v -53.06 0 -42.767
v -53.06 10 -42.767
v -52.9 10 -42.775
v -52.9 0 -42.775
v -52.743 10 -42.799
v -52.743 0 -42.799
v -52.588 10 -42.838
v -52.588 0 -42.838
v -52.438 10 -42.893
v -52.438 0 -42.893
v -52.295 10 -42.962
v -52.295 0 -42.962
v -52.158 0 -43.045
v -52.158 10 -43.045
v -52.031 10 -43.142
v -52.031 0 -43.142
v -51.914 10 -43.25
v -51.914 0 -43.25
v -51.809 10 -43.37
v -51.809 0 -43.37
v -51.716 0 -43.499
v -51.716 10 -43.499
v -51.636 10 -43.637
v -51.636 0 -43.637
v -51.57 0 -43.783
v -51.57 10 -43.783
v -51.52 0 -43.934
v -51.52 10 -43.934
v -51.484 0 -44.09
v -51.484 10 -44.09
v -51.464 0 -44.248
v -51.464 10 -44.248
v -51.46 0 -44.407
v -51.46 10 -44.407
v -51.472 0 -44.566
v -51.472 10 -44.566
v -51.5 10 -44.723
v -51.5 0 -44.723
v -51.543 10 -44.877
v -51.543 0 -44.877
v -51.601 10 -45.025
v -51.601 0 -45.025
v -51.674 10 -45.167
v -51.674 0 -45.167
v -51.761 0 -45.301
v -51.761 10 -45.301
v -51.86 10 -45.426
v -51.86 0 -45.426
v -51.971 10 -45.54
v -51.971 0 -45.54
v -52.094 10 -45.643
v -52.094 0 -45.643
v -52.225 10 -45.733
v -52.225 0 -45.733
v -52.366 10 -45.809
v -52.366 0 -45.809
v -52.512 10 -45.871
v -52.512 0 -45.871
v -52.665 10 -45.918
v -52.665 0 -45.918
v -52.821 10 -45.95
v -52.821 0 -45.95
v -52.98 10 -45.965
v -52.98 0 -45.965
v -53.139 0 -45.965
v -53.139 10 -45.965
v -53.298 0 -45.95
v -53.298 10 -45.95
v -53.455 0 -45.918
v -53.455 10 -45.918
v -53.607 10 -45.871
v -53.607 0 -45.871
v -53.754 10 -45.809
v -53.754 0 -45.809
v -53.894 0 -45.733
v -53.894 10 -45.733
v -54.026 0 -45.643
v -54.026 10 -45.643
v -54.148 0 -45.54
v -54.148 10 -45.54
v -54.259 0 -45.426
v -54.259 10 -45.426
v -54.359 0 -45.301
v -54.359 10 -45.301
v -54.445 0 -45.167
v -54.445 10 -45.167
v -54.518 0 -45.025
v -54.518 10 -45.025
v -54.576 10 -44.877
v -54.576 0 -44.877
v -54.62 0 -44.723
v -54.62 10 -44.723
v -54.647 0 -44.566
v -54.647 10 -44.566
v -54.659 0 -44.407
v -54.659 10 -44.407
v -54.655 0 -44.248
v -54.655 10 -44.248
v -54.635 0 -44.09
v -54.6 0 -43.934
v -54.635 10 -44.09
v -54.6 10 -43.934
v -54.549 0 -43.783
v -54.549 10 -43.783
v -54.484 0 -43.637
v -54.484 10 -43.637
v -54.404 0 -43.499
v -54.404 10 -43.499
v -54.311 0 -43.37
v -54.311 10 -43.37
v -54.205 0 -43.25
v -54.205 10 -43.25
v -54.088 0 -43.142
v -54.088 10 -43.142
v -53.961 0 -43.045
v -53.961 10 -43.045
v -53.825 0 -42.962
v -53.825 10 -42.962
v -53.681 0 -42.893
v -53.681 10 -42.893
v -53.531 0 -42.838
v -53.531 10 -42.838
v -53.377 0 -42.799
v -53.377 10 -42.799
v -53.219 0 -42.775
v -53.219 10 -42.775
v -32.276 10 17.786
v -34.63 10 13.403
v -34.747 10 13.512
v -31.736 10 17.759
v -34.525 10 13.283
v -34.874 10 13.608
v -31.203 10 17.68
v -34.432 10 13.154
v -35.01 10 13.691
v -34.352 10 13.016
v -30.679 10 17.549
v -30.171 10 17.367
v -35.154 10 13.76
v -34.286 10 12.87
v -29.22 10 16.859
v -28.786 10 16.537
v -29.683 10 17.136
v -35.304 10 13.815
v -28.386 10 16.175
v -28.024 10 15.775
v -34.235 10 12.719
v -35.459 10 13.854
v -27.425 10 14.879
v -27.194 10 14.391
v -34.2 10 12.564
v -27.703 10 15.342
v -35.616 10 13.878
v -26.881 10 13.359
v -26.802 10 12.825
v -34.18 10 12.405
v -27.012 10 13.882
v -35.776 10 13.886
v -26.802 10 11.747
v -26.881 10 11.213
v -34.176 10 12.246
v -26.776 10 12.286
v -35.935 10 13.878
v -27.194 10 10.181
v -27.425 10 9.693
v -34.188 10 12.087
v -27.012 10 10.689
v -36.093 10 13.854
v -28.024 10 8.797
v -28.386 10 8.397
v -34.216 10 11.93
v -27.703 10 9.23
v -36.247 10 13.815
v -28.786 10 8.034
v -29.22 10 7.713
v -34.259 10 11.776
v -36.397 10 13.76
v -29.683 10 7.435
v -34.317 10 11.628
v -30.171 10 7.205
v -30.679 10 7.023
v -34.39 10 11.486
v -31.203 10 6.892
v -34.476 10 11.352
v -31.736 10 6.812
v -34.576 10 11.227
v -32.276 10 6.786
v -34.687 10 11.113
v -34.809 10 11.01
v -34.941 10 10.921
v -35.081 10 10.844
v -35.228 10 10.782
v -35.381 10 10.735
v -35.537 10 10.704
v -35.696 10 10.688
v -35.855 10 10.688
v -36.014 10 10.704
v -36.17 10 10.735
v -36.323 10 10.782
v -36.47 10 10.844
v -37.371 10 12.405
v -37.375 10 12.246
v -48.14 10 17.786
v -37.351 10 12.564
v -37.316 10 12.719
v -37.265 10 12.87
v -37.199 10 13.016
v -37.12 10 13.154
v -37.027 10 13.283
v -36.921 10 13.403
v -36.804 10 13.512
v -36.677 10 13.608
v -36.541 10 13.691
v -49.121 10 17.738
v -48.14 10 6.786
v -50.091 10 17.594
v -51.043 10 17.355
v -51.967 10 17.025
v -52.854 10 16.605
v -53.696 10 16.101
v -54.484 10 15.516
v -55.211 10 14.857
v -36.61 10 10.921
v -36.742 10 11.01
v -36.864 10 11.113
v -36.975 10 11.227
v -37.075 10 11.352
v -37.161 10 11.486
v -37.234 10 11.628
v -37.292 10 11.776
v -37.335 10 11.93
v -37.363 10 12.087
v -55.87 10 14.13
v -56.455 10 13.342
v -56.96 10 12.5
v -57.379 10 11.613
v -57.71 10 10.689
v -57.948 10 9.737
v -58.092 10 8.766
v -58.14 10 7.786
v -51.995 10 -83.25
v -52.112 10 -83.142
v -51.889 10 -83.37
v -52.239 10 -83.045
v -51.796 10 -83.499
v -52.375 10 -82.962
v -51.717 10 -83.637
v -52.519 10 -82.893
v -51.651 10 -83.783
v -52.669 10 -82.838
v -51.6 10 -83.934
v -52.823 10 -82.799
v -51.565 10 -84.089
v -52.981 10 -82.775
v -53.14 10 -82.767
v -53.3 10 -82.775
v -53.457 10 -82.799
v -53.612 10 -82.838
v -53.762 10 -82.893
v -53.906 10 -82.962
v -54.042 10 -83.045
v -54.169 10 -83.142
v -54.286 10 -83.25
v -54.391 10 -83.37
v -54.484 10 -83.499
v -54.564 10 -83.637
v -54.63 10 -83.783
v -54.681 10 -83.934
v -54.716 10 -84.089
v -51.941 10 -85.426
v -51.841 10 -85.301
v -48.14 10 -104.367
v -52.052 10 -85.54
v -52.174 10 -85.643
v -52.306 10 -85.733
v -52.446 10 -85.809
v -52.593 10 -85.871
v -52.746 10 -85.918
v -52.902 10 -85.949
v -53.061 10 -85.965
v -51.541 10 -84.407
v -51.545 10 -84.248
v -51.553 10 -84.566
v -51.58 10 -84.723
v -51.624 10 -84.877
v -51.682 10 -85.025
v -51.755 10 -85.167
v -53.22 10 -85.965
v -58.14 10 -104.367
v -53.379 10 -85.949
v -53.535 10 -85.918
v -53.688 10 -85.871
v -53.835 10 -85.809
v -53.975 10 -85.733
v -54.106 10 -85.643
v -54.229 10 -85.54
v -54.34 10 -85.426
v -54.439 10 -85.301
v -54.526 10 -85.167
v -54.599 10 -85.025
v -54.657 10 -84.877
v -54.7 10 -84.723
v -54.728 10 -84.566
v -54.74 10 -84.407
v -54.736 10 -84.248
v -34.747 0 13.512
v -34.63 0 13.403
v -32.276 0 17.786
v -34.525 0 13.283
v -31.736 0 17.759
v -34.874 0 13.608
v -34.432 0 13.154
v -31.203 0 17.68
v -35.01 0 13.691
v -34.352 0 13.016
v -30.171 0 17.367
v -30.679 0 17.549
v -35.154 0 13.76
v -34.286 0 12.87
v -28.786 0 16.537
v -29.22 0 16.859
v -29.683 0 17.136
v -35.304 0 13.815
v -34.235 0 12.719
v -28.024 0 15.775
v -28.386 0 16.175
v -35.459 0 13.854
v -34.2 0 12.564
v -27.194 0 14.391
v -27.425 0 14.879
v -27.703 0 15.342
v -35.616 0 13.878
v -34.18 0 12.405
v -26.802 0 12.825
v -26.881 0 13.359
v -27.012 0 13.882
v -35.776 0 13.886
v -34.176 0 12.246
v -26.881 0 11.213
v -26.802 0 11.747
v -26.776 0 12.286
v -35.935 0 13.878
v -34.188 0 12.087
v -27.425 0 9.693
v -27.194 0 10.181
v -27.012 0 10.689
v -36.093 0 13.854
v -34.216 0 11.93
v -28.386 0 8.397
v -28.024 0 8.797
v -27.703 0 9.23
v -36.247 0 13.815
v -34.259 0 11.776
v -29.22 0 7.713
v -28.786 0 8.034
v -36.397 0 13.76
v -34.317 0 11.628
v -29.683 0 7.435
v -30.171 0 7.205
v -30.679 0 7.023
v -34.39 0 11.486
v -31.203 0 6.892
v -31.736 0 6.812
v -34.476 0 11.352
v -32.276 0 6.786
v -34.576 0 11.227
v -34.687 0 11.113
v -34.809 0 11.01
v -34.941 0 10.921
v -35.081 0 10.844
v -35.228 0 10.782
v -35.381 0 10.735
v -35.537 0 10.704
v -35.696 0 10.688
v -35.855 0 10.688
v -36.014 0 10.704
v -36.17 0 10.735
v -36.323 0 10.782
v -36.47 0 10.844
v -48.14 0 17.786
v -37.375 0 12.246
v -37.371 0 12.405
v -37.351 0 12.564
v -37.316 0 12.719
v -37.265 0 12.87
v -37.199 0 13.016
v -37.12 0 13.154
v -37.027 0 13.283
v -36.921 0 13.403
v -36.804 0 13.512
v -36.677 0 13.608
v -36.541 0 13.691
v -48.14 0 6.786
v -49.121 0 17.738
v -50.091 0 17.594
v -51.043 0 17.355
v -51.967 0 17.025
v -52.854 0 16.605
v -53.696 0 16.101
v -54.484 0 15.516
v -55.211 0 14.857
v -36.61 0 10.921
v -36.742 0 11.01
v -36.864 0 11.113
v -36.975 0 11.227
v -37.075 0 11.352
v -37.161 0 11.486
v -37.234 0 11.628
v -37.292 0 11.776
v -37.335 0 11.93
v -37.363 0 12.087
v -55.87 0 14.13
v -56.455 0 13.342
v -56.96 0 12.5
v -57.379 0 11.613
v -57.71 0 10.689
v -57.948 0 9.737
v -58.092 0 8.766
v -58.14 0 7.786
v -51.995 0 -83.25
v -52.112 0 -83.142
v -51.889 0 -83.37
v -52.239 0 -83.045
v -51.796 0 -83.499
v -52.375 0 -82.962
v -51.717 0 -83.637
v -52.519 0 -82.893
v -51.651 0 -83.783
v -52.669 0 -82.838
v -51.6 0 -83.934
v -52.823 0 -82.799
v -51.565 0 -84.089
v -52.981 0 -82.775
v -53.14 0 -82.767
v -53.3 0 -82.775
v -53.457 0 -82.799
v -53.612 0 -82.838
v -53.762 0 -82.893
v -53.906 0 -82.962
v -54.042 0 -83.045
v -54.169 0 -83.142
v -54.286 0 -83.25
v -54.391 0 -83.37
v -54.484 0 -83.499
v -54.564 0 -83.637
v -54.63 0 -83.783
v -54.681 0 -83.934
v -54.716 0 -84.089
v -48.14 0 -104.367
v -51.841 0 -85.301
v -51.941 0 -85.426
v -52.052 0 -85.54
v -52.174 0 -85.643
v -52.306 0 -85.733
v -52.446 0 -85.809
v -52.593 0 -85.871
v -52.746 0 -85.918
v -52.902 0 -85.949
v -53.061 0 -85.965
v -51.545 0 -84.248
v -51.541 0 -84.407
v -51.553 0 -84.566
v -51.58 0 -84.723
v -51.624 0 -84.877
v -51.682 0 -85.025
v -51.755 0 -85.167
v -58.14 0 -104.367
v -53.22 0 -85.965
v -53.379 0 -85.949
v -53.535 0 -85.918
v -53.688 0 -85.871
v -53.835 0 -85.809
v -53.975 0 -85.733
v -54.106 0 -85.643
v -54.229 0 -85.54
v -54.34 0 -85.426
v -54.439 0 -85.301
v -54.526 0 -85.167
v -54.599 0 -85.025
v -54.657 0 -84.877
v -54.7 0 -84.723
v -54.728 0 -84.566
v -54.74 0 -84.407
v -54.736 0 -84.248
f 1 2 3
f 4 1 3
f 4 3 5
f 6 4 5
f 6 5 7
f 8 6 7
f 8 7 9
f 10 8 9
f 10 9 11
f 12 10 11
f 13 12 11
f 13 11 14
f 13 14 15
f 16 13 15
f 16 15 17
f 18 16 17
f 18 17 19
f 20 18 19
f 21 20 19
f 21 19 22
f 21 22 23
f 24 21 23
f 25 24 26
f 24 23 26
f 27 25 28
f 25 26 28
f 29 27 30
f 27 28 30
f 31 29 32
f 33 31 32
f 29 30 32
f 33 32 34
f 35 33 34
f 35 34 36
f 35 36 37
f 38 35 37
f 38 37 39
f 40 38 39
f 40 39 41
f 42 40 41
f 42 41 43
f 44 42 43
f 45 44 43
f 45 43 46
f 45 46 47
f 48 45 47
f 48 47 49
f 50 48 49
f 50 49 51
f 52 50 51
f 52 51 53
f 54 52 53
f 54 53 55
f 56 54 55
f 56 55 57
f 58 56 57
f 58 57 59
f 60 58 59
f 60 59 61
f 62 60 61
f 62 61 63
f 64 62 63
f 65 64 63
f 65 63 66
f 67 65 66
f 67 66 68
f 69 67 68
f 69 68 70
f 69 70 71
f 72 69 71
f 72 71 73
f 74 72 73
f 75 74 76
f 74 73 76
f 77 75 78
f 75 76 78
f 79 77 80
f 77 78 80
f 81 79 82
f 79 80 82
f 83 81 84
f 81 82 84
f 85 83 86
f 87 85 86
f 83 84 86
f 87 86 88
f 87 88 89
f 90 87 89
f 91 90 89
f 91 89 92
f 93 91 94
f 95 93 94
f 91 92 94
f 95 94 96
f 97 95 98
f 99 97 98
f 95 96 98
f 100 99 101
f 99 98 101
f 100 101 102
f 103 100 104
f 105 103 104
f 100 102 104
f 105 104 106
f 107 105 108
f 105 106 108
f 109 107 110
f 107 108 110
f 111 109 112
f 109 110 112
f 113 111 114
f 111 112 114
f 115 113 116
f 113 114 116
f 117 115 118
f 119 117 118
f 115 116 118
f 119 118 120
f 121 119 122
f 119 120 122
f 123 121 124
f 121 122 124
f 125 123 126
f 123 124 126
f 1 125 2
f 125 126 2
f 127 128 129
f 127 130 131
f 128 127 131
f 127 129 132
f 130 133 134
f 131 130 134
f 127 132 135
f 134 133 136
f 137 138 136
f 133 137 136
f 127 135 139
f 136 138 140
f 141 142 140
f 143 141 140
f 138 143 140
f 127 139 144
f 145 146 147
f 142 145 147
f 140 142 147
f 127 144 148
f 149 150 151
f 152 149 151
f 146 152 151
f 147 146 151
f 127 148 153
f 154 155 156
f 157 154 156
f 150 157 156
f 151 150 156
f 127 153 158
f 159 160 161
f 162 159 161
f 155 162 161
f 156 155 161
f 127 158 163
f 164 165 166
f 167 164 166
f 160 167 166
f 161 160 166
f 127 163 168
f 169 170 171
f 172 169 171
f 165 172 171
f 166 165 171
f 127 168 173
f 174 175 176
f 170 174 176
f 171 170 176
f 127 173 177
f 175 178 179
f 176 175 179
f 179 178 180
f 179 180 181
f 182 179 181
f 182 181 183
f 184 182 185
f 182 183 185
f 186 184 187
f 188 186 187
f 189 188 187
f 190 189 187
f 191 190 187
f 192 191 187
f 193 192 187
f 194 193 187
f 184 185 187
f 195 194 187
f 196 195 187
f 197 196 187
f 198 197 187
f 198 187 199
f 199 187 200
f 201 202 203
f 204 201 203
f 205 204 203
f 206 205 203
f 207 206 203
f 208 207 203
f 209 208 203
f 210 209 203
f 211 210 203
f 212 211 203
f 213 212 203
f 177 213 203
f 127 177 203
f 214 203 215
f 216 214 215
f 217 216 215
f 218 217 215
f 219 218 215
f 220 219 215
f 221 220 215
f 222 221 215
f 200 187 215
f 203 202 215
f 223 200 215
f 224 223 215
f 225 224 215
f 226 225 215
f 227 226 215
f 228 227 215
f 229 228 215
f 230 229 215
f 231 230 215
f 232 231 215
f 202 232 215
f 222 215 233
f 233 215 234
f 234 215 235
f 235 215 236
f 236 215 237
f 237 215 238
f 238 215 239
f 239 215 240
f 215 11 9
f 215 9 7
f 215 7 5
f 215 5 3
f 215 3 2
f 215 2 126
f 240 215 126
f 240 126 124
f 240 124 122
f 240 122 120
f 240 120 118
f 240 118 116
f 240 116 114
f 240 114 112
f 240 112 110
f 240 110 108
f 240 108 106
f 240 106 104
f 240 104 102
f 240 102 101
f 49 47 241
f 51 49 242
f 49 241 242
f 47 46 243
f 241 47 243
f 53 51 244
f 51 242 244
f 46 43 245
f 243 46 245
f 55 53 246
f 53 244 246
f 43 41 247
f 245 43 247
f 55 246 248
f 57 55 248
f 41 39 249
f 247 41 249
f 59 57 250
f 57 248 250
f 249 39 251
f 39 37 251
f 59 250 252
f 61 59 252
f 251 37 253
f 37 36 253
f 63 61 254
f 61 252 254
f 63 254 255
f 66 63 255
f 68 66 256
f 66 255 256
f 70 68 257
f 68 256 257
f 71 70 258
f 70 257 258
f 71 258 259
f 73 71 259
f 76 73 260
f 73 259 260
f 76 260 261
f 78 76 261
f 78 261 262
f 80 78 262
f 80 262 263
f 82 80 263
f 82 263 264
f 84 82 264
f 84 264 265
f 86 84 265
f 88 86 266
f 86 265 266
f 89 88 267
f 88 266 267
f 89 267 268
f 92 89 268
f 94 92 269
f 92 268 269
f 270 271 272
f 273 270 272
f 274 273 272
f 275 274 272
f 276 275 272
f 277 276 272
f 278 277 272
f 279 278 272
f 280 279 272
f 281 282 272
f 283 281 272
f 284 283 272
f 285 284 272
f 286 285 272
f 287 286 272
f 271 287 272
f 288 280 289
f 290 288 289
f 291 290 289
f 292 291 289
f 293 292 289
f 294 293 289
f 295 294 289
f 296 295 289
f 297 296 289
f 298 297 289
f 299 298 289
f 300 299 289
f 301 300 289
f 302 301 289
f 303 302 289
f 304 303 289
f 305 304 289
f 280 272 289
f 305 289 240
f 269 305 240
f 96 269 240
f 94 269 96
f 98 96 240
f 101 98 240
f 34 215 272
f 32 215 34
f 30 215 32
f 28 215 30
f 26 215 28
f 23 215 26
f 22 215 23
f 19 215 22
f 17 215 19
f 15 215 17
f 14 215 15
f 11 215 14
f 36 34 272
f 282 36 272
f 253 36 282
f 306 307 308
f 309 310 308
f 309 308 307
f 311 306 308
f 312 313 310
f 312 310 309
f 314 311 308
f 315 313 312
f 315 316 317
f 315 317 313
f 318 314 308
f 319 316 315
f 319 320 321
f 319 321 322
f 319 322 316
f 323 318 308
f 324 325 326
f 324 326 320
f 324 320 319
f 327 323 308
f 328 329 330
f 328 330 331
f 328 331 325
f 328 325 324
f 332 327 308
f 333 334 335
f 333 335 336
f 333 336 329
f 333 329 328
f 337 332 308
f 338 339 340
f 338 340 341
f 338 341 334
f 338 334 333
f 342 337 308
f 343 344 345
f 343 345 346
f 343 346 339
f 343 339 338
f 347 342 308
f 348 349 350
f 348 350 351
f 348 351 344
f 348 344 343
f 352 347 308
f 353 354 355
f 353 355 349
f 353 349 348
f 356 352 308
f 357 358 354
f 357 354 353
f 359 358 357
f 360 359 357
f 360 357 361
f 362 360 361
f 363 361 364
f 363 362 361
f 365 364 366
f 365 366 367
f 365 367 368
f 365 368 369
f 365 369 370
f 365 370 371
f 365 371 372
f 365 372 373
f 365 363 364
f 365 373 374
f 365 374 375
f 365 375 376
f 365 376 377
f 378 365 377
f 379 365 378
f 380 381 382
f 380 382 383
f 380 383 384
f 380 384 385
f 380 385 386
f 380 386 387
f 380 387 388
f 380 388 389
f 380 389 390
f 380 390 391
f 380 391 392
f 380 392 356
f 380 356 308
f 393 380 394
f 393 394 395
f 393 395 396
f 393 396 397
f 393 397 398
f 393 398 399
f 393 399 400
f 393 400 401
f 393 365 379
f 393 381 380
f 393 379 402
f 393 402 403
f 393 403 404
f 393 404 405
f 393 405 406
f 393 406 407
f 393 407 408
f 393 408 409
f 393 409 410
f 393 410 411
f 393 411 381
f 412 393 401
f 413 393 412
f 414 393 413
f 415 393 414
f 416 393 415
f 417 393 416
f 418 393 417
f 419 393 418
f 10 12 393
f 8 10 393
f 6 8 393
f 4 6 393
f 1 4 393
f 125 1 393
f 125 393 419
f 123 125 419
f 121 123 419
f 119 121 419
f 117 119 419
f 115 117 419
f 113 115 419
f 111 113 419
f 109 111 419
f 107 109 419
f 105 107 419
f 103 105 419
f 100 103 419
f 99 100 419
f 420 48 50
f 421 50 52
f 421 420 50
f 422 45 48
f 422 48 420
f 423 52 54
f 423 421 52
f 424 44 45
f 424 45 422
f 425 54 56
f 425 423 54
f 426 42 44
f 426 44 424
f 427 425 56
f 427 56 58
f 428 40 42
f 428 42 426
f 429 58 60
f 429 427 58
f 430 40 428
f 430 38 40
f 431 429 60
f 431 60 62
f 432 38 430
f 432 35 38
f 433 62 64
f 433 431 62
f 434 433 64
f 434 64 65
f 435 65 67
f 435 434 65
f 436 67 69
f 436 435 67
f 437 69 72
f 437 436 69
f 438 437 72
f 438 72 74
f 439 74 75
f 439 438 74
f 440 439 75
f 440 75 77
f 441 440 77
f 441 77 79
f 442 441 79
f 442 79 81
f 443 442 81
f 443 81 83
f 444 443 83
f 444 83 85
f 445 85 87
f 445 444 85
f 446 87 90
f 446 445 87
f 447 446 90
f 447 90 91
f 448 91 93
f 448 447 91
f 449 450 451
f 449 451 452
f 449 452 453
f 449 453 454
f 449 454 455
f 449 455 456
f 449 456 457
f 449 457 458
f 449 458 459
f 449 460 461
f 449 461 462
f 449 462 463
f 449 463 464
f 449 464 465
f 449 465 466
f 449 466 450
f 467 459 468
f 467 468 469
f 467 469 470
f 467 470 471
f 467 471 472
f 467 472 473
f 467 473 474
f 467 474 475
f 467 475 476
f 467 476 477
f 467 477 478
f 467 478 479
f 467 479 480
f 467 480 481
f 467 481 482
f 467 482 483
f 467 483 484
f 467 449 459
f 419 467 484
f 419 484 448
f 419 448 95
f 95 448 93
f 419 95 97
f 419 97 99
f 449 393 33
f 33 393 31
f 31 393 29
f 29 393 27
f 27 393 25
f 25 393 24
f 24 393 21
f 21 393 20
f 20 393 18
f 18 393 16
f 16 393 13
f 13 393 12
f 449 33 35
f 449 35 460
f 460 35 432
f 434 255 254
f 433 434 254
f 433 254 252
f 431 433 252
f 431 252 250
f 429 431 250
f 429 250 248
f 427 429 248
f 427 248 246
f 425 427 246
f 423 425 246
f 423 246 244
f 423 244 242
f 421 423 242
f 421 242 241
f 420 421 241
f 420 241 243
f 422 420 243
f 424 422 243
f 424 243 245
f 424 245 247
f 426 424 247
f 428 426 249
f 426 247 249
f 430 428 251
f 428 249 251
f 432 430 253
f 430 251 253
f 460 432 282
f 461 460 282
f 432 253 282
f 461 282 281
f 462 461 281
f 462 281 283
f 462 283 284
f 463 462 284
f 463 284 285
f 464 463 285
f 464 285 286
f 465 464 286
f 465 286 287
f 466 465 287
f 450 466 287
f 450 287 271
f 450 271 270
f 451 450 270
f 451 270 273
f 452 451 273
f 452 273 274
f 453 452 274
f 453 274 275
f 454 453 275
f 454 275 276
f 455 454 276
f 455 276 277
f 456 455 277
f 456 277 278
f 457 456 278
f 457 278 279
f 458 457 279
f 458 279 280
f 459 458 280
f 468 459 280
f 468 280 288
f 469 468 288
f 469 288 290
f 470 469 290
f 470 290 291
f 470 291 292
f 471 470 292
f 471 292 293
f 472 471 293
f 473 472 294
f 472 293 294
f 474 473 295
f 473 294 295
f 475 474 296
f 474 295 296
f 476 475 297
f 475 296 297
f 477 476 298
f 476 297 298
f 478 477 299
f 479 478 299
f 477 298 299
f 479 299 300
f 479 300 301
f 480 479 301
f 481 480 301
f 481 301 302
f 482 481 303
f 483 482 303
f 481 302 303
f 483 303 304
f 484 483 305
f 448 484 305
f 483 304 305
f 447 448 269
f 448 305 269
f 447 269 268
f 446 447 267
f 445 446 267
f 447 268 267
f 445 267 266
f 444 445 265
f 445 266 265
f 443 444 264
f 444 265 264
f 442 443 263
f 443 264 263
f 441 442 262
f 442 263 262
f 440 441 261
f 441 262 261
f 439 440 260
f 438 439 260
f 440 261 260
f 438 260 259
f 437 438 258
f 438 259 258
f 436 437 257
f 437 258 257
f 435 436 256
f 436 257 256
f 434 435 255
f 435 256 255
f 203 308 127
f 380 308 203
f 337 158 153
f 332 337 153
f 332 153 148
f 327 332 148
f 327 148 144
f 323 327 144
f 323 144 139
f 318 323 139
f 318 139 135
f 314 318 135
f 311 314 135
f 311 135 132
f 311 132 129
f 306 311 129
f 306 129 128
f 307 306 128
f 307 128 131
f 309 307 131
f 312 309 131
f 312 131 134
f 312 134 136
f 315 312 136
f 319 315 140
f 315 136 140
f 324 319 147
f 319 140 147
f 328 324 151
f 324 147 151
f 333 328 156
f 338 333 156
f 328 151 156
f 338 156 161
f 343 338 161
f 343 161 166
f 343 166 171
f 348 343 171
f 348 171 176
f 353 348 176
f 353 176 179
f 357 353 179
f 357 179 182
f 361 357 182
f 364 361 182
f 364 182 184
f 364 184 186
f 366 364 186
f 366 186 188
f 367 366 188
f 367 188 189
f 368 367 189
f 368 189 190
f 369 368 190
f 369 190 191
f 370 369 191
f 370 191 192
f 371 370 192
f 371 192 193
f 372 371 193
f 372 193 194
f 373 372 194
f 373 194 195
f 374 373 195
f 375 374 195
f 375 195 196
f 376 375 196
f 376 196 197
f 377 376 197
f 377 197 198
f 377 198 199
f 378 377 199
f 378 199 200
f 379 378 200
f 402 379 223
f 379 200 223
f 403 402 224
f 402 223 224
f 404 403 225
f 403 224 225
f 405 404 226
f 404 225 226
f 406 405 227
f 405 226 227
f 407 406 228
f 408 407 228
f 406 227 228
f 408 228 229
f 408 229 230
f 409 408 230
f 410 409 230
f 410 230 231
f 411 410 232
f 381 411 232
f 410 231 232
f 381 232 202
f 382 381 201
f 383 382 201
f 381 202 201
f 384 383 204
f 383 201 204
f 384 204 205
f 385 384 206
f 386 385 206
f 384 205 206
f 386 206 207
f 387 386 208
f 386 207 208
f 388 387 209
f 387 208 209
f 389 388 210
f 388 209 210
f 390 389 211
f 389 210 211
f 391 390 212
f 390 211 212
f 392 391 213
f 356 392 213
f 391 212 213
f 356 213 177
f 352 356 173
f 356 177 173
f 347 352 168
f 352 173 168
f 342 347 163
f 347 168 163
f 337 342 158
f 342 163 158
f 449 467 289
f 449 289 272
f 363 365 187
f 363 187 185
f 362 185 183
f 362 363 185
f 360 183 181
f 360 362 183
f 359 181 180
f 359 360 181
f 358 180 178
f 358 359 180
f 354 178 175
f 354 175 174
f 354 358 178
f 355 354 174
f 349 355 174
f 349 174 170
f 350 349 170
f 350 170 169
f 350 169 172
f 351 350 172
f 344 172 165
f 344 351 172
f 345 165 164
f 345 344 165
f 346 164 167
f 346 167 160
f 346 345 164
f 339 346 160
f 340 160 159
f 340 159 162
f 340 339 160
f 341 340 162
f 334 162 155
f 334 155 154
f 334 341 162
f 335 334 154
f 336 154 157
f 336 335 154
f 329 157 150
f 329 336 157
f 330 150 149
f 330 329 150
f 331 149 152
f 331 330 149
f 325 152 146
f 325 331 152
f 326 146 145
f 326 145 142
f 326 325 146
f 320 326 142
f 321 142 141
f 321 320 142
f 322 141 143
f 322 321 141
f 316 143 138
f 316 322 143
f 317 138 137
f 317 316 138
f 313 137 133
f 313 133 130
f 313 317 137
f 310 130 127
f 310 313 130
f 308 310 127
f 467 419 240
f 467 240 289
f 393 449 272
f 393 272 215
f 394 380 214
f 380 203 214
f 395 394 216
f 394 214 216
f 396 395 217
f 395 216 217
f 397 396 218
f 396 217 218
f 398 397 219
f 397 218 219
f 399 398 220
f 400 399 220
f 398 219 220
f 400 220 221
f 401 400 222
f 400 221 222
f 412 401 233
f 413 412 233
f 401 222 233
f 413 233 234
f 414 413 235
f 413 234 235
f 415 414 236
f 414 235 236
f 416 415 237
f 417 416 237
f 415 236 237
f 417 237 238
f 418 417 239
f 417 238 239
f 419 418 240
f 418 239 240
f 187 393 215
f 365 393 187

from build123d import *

# Parameters (mm, degrees)
BOSS_EXTRUDE1_DEPTH  = 10
FILLET1_R            = 10
M3_CLEARANCE_HOLE1_D = 3.2


with BuildPart() as part:
    # Sketch1 → Boss-Extrude1 (new body)
    with BuildSketch(Plane(origin=(0, 0, 0), x_dir=(1, 0, 0), z_dir=(0, 1, 0))):
        with BuildLine():
            Line((-58.140357718, 104.367316493), (-48.140357718, 104.367316493))
            Line((-48.140357718, 104.367316493), (-48.140357718, -6.785904903))
            Line((-48.140357718, -6.785904903), (-32.275583784, -6.785904903))
            ThreePointArc((-32.275583784, -6.785904903), (-26.775583784, -12.285904903), (-32.275583784, -17.785904903))
            Line((-32.275583784, -17.785904903), (-58.140357718, -17.785904903))
            Line((-58.140357718, -17.785904903), (-58.140357718, -6.785904903))
            Line((-58.140357718, -6.785904903), (-58.140357718, 104.367316493))
        make_face()
    extrude(amount=BOSS_EXTRUDE1_DEPTH)

    # Fillet1
    fillet1_edges = [part.edges().sort_by_distance(p)[0] for p in [
        (-58.140357718, 5, 17.785904903),
    ]]
    fillet(fillet1_edges, radius=FILLET1_R)

    # M3 Clearance Hole1 (through all)
    with Locations(Plane(origin=(-35.775583784, 0, 12.285904903), x_dir=(0, 0, -1), z_dir=(0, -1, 0))):
        with Locations((0, 0), (96.653221396, -17.364773934), (56.653302681, -17.284133769)):
            Hole(M3_CLEARANCE_HOLE1_D / 2)


solid = part.part
